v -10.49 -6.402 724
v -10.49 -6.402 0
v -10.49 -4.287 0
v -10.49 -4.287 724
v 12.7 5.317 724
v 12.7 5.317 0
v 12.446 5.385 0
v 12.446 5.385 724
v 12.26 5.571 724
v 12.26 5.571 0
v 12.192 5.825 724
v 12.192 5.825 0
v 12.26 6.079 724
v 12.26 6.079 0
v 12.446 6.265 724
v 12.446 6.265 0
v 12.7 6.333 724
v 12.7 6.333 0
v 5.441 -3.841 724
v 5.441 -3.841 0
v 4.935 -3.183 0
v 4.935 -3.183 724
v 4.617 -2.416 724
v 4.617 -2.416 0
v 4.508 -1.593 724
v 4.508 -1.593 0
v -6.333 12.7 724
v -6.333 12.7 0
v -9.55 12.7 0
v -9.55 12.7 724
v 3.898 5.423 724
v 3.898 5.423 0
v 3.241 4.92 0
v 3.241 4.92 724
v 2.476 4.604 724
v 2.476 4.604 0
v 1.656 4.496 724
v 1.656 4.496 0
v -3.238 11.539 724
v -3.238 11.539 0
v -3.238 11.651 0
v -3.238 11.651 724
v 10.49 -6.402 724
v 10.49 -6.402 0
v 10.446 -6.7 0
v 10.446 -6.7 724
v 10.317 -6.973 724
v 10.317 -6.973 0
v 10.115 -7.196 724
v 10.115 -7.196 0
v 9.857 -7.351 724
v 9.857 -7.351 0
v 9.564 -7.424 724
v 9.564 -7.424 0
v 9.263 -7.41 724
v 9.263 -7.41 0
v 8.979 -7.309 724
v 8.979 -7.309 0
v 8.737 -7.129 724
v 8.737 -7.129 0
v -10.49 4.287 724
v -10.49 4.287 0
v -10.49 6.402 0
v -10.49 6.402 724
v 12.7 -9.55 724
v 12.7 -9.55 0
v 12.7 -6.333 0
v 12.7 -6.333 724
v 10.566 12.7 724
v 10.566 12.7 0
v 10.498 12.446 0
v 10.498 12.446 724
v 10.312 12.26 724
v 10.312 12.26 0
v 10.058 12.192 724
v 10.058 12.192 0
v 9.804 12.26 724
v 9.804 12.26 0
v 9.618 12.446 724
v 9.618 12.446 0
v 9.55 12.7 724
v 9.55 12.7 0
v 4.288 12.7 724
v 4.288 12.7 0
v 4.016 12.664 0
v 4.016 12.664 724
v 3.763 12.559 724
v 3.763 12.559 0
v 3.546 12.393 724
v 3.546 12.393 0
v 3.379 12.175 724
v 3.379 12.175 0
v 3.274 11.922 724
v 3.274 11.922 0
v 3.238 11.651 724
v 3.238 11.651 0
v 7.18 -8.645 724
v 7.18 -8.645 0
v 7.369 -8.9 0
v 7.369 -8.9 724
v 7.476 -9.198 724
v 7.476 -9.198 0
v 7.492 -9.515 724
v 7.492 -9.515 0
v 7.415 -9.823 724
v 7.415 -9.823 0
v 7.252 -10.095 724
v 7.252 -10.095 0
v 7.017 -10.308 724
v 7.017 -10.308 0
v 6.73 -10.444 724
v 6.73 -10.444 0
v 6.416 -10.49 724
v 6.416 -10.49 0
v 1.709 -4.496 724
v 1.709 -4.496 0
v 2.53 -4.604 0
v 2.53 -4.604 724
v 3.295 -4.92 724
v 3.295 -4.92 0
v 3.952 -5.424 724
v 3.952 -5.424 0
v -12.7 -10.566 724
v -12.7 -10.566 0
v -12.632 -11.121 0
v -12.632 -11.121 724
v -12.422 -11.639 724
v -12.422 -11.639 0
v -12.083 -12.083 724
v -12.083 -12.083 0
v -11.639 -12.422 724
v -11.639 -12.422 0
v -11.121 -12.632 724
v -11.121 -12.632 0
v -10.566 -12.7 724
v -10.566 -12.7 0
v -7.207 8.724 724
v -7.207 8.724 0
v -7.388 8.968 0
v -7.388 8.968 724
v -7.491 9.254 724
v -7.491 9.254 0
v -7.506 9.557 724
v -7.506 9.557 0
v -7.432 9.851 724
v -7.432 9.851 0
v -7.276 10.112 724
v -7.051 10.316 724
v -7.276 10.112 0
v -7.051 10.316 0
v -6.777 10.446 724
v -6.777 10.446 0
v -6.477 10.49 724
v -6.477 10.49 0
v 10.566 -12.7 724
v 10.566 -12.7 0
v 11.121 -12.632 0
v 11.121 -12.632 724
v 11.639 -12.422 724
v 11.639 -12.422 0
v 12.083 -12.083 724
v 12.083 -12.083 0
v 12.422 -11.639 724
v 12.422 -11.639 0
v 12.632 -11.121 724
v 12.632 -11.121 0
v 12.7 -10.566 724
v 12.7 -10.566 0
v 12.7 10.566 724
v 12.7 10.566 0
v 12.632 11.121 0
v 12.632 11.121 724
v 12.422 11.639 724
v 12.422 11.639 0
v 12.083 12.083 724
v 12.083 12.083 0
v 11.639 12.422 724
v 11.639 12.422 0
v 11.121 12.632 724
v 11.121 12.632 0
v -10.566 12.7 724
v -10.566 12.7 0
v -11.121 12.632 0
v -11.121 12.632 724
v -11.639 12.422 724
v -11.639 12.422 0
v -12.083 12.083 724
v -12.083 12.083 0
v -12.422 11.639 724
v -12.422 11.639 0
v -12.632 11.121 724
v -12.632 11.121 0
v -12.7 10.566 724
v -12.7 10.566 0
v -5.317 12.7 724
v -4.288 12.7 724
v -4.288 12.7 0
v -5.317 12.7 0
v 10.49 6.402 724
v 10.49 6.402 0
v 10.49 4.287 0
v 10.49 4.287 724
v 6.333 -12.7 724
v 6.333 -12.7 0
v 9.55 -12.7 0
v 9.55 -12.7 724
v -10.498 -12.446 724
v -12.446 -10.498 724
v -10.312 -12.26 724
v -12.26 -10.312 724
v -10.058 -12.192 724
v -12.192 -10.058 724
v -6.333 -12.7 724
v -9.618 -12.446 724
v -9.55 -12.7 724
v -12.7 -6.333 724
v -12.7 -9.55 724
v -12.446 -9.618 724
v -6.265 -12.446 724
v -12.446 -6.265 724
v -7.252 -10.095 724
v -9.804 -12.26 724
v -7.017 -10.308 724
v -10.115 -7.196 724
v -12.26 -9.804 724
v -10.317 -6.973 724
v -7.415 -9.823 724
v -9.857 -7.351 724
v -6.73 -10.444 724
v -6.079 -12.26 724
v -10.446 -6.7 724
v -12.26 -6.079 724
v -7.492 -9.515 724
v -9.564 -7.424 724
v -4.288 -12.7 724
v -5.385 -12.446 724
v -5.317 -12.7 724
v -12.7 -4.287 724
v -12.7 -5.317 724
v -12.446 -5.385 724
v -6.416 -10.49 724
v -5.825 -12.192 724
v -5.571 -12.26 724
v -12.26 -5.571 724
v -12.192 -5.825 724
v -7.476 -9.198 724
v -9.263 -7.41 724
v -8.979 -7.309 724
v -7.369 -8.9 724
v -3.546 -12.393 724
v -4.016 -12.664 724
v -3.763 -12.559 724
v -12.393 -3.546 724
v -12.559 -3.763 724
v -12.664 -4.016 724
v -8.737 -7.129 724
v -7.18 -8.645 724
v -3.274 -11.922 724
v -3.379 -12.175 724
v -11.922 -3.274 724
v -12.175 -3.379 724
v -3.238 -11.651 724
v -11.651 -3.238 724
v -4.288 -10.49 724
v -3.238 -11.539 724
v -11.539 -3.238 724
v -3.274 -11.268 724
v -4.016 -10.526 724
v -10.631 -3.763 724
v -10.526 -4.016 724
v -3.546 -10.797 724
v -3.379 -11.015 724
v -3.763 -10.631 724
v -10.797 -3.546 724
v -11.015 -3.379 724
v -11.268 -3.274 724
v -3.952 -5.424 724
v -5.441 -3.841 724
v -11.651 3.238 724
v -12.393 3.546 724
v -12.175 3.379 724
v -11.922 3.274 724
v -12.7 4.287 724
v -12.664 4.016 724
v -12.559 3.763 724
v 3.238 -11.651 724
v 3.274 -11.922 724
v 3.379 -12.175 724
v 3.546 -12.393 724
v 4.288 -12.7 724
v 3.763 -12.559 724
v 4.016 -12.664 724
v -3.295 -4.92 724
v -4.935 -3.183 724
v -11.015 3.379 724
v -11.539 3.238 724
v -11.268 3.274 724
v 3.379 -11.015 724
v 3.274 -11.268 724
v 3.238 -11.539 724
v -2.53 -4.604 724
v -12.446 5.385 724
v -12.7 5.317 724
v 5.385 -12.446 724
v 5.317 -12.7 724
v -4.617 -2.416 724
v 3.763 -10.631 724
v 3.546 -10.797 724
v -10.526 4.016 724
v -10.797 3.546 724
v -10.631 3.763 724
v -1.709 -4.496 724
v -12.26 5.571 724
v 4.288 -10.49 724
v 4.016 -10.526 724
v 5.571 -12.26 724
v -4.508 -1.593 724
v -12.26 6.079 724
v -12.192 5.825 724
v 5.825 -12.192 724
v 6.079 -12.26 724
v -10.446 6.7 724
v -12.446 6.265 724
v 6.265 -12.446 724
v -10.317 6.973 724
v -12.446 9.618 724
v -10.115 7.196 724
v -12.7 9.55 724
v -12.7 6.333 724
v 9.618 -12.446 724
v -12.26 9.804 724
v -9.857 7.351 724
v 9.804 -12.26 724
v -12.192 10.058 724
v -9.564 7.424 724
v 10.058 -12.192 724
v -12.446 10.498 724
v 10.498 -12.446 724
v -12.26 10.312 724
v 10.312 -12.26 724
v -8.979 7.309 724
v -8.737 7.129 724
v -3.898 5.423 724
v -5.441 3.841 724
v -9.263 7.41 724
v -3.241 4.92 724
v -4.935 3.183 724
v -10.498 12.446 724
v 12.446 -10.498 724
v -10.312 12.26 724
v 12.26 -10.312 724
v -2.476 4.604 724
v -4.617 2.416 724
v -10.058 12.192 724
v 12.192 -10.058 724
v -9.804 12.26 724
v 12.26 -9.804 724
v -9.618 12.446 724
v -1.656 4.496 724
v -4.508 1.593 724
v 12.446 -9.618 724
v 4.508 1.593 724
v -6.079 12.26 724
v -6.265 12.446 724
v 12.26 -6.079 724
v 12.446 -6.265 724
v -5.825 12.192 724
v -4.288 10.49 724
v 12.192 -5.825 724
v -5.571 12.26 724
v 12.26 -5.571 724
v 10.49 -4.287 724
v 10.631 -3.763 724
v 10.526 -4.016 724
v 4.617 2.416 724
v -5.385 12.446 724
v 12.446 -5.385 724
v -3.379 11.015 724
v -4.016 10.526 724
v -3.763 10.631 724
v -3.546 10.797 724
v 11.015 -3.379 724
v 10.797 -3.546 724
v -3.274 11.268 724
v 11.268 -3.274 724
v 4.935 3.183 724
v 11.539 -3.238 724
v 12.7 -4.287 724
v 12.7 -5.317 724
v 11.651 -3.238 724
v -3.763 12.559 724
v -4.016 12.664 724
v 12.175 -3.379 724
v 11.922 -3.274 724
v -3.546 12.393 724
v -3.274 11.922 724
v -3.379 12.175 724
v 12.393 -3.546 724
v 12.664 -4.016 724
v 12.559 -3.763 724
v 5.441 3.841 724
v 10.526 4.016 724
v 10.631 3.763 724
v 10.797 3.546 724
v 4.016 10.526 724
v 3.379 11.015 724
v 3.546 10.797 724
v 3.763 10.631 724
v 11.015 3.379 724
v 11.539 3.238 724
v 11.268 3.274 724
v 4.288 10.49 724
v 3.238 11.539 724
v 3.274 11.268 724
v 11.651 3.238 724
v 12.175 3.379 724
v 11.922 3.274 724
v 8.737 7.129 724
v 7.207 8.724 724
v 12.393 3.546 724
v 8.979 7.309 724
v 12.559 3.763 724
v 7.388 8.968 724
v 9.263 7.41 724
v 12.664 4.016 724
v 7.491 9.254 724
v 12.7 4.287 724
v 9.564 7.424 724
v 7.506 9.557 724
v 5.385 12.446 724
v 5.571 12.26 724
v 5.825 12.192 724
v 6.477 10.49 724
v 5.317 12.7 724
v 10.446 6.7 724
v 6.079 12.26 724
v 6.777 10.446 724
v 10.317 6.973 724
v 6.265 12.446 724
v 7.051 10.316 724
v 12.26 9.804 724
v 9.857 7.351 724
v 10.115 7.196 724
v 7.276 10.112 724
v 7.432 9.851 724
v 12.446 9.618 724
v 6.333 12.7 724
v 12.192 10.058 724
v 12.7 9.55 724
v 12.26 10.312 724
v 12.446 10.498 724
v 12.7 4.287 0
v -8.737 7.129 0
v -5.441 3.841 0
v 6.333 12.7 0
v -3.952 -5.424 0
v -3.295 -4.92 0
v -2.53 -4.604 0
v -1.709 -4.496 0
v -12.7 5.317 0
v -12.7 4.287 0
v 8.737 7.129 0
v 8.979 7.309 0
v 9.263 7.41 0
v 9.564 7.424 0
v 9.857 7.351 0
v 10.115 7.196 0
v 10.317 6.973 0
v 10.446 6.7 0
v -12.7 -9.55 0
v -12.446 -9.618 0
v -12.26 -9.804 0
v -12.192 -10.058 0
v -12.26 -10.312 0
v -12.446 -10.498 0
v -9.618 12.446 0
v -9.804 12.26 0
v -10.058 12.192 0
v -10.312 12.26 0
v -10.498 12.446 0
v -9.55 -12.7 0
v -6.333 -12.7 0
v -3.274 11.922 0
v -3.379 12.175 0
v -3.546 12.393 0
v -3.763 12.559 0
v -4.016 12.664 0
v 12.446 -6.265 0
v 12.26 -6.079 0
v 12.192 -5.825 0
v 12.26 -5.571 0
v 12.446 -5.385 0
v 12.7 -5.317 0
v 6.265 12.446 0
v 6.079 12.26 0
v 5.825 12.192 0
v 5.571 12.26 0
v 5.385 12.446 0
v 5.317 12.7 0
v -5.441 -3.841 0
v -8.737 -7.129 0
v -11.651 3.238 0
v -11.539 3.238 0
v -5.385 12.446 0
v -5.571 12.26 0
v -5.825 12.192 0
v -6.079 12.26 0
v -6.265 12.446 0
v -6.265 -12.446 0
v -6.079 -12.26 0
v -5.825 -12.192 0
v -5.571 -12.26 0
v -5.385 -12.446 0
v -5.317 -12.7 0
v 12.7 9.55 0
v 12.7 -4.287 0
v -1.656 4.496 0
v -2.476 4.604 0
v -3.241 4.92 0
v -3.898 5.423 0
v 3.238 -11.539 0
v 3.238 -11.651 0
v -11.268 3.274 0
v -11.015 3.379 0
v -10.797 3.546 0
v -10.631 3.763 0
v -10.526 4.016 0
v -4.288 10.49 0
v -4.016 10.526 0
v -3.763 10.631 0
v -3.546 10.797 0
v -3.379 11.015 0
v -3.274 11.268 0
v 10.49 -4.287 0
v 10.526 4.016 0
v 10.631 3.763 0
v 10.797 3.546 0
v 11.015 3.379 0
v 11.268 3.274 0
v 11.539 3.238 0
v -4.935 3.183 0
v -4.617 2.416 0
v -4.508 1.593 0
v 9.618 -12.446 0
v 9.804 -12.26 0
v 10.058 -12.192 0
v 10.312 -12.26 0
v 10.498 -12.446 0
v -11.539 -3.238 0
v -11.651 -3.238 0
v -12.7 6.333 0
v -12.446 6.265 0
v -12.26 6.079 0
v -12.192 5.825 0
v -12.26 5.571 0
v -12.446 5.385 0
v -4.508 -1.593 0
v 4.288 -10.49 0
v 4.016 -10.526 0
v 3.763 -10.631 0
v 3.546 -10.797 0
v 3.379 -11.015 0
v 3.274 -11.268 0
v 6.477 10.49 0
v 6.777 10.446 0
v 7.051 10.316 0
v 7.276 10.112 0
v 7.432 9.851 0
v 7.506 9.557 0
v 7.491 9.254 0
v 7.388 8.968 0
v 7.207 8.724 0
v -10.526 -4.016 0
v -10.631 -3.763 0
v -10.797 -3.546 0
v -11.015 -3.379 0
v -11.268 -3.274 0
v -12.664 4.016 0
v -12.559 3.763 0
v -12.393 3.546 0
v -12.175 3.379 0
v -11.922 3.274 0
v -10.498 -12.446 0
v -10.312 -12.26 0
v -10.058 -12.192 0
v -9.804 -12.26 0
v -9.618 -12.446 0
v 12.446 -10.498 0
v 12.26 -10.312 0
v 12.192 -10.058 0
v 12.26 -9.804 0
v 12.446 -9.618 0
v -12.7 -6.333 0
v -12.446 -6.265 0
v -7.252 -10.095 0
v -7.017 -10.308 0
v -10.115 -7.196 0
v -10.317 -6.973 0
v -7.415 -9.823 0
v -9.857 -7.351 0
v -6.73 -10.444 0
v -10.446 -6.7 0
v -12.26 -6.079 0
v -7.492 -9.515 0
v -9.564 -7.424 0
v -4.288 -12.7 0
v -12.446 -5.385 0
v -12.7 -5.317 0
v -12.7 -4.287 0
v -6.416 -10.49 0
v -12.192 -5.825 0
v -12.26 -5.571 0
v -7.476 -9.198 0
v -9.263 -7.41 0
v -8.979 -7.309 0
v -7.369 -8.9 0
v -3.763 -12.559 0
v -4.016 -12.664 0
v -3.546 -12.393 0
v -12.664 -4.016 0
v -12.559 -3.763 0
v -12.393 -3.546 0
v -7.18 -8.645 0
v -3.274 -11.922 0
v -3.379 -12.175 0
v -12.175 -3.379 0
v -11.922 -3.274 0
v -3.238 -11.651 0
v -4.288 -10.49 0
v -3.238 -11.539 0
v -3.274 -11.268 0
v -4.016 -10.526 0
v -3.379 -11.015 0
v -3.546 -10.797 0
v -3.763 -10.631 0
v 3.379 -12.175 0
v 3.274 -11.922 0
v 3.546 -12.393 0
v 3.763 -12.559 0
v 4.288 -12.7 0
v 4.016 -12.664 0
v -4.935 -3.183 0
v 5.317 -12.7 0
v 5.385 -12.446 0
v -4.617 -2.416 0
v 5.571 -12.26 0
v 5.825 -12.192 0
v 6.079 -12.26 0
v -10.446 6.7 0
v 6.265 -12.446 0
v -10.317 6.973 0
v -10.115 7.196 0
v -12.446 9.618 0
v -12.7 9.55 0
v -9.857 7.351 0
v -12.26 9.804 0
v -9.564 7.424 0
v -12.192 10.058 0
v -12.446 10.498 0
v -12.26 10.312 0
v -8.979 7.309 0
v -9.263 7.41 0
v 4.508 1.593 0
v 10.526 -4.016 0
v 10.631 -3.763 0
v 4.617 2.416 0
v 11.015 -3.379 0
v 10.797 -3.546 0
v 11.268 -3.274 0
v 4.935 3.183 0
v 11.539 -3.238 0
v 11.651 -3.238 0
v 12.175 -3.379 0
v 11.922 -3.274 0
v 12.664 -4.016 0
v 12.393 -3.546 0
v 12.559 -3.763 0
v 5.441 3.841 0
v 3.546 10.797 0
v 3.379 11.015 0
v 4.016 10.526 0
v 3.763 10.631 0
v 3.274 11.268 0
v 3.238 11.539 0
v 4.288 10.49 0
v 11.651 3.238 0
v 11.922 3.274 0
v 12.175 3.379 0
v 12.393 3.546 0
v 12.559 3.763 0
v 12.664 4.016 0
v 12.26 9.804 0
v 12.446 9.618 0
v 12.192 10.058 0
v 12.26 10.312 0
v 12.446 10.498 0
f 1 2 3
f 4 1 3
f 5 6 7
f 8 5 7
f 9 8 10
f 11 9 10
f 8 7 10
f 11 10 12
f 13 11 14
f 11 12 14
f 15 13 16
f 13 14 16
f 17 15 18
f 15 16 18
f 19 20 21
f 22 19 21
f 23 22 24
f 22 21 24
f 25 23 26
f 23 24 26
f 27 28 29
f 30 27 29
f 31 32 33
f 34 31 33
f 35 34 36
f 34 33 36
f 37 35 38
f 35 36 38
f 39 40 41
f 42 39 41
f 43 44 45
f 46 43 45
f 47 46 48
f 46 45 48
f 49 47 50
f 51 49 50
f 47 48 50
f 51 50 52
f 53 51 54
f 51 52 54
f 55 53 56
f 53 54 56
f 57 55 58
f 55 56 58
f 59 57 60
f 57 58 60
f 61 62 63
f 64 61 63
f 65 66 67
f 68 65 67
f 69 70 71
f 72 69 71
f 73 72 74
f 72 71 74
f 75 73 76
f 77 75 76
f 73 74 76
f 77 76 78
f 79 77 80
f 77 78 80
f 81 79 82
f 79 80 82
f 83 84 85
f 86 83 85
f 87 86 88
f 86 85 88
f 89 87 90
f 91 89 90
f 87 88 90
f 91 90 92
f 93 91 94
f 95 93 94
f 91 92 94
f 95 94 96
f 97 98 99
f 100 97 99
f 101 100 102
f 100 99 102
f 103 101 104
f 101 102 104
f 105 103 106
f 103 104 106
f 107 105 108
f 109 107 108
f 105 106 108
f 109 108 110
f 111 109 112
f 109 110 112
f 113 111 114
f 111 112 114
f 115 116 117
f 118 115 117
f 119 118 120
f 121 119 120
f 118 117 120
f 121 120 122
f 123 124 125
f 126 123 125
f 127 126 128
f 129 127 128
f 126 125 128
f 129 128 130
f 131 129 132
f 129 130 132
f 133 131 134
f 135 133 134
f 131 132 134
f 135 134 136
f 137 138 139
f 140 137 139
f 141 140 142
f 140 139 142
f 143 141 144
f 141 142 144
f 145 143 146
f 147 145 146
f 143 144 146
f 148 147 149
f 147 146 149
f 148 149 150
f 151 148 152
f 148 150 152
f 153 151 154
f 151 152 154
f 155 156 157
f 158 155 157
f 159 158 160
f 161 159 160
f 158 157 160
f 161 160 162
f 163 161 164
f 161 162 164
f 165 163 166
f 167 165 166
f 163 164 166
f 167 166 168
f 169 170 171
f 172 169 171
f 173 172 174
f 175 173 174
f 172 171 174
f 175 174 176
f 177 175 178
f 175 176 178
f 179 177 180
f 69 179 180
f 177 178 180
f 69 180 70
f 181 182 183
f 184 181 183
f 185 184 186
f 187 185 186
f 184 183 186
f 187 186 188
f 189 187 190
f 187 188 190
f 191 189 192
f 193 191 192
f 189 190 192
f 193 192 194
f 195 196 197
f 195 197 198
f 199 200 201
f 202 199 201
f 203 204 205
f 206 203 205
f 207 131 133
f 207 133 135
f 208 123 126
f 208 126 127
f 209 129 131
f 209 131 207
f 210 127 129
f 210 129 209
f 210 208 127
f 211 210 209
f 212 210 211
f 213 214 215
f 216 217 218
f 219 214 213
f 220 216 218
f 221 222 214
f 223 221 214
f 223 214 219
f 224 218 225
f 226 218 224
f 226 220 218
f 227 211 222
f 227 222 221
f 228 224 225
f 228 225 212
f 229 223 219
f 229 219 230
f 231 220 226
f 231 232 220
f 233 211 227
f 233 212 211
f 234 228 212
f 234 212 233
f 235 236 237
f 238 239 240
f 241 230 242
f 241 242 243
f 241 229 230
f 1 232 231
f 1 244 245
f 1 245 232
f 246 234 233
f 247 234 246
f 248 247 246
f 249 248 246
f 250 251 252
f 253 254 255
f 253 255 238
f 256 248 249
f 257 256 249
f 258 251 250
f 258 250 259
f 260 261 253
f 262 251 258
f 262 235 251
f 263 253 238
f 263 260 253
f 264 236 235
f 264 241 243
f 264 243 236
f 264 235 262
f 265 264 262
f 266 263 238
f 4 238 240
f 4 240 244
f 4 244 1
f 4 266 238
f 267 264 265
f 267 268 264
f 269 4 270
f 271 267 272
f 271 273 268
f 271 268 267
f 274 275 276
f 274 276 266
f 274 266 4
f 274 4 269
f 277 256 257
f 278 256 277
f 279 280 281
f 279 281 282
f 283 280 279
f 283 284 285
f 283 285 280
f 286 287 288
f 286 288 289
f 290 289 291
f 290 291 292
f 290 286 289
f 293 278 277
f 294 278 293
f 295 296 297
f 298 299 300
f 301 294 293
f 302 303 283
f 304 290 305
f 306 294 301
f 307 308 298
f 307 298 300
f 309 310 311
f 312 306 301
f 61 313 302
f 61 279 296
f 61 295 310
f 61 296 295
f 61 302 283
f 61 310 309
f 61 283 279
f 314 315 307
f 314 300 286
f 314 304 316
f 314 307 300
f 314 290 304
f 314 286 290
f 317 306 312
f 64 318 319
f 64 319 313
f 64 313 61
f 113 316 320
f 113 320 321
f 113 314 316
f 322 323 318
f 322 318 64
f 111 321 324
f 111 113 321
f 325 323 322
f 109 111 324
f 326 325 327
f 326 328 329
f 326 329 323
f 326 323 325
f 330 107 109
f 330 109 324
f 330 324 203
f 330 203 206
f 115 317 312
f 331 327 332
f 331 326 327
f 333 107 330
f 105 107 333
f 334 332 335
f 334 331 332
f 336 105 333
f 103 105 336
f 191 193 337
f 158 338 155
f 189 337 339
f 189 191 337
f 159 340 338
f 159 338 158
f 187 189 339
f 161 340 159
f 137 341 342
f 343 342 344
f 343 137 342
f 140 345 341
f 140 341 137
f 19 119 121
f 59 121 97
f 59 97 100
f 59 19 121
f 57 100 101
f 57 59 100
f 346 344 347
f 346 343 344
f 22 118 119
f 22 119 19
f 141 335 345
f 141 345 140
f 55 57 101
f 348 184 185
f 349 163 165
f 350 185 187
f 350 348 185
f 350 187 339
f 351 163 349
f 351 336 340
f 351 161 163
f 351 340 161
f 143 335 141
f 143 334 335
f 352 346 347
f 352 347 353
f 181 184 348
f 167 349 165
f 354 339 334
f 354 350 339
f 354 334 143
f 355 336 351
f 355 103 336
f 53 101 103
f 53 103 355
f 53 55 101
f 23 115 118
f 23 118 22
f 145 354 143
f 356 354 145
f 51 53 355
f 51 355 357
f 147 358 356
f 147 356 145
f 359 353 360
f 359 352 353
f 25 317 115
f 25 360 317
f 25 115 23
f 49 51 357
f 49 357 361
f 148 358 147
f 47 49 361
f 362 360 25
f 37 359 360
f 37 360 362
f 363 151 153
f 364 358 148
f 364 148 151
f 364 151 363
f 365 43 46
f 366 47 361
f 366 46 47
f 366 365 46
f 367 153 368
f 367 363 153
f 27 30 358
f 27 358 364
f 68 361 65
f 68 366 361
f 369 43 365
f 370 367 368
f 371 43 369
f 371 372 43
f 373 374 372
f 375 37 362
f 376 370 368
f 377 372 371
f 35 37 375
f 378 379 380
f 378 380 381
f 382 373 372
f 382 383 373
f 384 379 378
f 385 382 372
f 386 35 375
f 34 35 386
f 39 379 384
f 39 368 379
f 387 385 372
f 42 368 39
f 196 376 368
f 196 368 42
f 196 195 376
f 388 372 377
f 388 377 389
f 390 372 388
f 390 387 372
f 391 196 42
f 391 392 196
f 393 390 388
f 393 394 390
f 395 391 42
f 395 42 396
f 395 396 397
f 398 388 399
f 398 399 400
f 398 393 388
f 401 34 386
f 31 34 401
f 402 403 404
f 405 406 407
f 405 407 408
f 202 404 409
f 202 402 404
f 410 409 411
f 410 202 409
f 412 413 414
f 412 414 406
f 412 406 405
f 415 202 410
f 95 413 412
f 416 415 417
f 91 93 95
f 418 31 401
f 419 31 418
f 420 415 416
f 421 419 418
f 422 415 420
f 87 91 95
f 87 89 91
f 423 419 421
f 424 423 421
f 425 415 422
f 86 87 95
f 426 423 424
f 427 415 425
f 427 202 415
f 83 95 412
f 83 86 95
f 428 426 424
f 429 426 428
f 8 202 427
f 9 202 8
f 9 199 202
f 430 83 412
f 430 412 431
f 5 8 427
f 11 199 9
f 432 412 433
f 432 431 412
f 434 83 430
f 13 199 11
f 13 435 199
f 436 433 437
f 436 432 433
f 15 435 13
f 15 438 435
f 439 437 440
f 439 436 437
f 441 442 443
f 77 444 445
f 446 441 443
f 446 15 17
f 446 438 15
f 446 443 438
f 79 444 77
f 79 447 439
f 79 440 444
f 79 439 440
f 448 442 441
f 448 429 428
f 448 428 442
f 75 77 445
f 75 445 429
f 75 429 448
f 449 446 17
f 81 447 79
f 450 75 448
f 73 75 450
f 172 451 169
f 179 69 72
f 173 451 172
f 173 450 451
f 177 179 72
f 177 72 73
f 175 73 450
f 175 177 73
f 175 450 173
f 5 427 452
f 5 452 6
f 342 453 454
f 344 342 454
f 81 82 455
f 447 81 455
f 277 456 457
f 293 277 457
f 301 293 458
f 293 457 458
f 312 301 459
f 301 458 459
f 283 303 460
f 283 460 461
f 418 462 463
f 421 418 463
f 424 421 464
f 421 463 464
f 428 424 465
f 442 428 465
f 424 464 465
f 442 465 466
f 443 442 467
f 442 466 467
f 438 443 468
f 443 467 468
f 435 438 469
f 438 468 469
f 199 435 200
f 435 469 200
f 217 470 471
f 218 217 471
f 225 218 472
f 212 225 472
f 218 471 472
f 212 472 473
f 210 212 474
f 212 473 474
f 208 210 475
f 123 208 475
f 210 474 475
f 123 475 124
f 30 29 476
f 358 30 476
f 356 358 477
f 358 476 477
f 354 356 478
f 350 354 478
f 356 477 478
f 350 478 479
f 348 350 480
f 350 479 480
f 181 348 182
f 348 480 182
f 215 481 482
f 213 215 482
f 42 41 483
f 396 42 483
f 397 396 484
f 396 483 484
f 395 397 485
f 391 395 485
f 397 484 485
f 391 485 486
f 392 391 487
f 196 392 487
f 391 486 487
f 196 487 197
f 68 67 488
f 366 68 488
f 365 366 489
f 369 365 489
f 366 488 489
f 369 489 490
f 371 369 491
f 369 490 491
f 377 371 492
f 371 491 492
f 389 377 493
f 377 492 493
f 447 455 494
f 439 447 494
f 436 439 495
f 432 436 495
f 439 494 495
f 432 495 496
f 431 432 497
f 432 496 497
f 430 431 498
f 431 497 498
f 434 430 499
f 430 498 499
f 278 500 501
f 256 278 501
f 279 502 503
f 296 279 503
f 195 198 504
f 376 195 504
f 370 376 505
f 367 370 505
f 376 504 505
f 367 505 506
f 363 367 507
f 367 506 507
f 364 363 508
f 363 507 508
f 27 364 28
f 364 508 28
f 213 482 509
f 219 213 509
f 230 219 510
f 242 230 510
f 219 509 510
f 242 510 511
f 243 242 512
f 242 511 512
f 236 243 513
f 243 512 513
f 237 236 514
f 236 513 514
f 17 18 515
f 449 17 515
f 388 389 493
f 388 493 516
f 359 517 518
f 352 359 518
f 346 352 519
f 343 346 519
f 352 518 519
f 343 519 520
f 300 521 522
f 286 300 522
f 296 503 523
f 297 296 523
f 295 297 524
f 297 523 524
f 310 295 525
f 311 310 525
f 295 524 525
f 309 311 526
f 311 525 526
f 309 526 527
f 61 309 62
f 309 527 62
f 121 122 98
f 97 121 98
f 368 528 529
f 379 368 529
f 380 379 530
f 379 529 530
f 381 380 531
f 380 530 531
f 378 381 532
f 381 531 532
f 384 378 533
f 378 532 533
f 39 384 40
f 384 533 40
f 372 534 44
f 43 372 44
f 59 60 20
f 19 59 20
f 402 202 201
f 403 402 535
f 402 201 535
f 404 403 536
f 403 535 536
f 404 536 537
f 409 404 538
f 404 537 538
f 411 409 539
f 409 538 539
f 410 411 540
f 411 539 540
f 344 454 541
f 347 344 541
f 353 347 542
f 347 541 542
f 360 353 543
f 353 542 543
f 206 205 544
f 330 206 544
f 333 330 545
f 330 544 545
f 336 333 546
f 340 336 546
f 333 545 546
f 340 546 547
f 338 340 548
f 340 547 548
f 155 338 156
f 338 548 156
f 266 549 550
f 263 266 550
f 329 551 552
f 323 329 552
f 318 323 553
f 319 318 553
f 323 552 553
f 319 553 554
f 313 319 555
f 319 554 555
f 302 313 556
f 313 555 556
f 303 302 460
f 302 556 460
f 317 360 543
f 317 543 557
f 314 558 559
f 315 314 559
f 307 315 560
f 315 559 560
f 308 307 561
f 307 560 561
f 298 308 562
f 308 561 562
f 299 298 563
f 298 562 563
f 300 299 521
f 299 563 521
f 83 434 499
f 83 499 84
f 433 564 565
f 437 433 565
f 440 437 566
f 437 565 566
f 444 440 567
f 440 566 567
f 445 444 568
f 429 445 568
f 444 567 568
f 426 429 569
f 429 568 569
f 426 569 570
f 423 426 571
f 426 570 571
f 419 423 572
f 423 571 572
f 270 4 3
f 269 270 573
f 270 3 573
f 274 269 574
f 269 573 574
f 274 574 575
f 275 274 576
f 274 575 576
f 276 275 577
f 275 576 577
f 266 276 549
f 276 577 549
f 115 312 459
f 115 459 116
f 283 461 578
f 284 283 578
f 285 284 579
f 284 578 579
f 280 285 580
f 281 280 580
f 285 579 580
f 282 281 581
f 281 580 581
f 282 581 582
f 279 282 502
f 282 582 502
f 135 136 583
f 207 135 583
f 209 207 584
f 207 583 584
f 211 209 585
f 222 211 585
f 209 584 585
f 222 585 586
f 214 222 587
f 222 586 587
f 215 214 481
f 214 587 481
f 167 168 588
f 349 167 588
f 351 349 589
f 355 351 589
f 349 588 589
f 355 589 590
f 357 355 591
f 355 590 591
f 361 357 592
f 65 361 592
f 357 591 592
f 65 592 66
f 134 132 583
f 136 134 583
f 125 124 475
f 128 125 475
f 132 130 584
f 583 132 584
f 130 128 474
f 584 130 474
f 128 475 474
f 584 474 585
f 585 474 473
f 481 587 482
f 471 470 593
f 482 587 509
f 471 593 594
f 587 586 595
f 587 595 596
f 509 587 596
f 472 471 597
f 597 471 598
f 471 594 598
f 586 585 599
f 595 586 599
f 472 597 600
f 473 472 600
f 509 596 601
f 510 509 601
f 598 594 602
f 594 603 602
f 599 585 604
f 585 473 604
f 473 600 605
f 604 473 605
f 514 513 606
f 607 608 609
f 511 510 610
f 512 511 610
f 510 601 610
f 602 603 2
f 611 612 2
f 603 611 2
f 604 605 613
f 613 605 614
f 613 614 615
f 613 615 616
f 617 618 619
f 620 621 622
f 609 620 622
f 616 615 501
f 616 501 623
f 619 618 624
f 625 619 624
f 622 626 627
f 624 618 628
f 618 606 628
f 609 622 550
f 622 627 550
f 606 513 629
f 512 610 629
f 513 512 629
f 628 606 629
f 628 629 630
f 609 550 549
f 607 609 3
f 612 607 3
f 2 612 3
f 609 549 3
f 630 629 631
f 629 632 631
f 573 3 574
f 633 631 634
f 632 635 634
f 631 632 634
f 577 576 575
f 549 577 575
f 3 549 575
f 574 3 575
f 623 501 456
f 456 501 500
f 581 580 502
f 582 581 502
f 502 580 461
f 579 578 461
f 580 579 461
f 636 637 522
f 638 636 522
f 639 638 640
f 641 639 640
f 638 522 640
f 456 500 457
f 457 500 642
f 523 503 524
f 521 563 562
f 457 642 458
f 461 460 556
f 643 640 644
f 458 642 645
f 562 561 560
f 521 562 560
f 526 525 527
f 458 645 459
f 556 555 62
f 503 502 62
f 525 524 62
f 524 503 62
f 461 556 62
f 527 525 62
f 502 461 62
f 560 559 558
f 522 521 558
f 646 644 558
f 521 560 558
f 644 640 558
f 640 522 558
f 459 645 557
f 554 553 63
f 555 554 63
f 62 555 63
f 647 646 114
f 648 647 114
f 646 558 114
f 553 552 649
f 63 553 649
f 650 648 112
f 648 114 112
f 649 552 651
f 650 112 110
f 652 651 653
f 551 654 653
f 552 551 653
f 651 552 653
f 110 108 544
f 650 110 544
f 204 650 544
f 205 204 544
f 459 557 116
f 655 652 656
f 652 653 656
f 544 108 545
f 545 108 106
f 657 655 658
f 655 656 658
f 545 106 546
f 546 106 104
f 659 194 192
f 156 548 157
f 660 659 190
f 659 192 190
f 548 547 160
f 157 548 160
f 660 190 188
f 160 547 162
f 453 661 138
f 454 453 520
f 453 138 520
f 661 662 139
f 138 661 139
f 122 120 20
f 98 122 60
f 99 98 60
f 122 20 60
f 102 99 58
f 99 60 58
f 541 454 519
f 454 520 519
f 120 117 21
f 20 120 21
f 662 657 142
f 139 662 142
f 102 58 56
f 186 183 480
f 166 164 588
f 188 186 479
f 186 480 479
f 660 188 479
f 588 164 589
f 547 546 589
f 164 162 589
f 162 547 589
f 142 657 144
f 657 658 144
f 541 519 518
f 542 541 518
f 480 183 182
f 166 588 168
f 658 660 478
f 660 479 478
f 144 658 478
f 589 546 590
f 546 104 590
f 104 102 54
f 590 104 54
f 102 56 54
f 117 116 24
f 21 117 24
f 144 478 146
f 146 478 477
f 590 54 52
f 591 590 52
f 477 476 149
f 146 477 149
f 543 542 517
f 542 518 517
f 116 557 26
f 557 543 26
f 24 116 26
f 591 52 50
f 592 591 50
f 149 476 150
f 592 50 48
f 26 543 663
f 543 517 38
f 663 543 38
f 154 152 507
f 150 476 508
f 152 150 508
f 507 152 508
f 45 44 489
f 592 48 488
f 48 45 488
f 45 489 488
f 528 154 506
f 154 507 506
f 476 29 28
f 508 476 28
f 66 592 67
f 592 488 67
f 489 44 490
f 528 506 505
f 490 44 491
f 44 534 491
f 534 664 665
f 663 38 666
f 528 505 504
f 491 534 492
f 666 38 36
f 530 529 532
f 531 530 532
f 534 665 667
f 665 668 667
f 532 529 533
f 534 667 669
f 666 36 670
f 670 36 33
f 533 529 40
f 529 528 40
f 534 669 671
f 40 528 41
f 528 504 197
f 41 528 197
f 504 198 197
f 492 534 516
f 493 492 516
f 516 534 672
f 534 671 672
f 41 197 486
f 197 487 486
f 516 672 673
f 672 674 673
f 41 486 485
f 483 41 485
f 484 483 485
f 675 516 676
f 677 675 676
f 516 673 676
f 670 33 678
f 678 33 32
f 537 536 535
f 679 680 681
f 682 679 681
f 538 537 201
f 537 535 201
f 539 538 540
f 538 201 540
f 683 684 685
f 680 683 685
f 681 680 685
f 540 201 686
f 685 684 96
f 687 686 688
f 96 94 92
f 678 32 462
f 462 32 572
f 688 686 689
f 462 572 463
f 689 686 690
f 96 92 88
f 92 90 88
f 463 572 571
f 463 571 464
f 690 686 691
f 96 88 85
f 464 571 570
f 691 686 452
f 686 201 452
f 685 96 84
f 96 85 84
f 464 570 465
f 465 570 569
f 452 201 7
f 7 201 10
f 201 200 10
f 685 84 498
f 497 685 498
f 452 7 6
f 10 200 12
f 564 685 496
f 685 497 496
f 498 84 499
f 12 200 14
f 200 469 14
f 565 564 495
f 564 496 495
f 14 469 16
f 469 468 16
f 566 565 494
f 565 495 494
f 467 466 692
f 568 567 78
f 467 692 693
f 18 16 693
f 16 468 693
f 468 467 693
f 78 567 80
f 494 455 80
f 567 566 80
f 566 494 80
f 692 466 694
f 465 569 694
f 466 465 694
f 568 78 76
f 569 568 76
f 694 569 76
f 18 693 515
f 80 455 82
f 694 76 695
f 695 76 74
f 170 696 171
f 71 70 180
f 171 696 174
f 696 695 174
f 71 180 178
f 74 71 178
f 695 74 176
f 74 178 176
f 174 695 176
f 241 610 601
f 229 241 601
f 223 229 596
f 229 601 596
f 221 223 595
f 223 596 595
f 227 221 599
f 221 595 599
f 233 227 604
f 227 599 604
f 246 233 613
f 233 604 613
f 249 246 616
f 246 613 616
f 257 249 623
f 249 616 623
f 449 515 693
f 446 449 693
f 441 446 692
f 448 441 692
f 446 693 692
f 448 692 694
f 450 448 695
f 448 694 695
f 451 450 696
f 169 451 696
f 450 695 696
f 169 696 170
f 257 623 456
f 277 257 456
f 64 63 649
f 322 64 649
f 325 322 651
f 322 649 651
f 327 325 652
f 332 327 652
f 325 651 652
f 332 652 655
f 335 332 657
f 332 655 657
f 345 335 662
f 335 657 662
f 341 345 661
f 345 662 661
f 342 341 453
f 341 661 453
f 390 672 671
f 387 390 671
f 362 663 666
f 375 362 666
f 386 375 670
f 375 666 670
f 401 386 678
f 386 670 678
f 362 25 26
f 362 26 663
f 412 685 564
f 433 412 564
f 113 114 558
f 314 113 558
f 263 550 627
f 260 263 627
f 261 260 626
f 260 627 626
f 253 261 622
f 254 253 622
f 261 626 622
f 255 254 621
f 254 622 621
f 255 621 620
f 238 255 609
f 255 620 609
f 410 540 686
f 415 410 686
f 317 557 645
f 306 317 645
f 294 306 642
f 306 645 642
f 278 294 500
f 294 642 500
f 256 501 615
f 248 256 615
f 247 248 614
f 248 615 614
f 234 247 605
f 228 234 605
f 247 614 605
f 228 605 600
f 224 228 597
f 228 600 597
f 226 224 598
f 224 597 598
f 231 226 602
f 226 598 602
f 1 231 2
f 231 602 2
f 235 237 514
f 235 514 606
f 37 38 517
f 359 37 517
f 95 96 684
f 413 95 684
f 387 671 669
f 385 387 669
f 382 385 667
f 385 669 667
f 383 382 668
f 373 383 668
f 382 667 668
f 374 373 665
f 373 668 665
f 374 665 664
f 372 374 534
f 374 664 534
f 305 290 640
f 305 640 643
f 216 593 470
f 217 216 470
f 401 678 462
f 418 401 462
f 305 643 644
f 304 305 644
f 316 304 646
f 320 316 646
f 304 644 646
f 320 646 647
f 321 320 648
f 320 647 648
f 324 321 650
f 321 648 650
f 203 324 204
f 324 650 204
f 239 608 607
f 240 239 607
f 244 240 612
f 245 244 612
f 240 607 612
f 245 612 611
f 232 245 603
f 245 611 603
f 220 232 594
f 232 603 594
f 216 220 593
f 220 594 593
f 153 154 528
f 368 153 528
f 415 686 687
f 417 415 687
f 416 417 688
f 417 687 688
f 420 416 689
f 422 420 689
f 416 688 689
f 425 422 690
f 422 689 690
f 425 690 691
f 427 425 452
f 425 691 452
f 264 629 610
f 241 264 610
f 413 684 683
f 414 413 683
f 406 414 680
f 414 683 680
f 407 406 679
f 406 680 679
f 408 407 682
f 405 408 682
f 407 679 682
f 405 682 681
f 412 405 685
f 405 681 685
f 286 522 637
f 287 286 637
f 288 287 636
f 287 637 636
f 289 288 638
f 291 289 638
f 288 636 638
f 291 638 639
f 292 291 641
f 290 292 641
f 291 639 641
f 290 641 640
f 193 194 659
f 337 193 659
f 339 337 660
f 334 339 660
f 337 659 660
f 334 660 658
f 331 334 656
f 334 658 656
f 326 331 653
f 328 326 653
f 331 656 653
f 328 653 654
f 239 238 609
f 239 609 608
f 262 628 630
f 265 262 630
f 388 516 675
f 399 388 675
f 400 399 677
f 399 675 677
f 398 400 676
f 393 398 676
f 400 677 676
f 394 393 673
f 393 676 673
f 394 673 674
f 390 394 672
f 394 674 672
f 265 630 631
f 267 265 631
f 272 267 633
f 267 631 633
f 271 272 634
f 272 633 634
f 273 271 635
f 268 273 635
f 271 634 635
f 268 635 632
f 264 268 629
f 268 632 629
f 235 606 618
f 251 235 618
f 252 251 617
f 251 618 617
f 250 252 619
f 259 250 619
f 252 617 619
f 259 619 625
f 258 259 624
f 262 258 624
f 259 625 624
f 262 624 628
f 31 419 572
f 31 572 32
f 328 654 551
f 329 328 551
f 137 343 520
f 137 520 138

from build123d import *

# Parameters (mm, degrees)
F1_DEPTH = 724


with BuildPart() as f1:
    # F0 (on Top) → F1 (new body)
    with BuildSketch(Plane.XY):
        with BuildLine():
            ThreePointArc((-10.4902, 6.402089), (-9.856505, 7.351068), (-8.737131, 7.129409))
            Line((-8.737131, 7.129409), (-5.441006, 3.840816))
            ThreePointArc((-5.441006, 3.840816), (-4.750878, 2.809883), (-4.5085, 1.593186))
            Line((-4.5085, 1.593186), (-4.5085, -1.593186))
            ThreePointArc((-4.5085, -1.593186), (-4.750878, -2.809883), (-5.441006, -3.840816))
            Line((-5.441006, -3.840816), (-8.737131, -7.129409))
            ThreePointArc((-8.737131, -7.129409), (-9.856505, -7.351068), (-10.4902, -6.402089))
            Line((-10.4902, -6.402089), (-10.4902, -4.287469))
            ThreePointArc((-10.4902, -4.287469), (-10.797449, -3.545706), (-11.539212, -3.238457))
            Line((-11.539212, -3.238457), (-11.650988, -3.238457))
            ThreePointArc((-11.650988, -3.238457), (-12.392751, -3.545706), (-12.7, -4.287469))
            Line((-12.7, -4.287469), (-12.7, -5.317084))
            ThreePointArc((-12.7, -5.317084), (-12.192, -5.825084), (-12.7, -6.333084))
            Line((-12.7, -6.333084), (-12.7, -9.5504))
            ThreePointArc((-12.7, -9.5504), (-12.191923, -10.058323), (-12.699847, -10.5664))
            ThreePointArc((-12.699847, -10.5664), (-12.082538, -12.082507), (-10.566443, -12.699848))
            ThreePointArc((-10.566443, -12.699848), (-10.058367, -12.191924), (-9.550443, -12.7))
            Line((-9.550443, -12.7), (-6.333127, -12.7))
            ThreePointArc((-6.333127, -12.7), (-5.825127, -12.192), (-5.317127, -12.7))
            Line((-5.317127, -12.7), (-4.287512, -12.7))
            ThreePointArc((-4.287512, -12.7), (-3.545749, -12.392751), (-3.2385, -11.650988))
            Line((-3.2385, -11.650988), (-3.2385, -11.539212))
            ThreePointArc((-3.2385, -11.539212), (-3.545749, -10.797449), (-4.287512, -10.4902))
            Line((-4.287512, -10.4902), (-6.416408, -10.4902))
            ThreePointArc((-6.416408, -10.4902), (-7.414731, -9.822813), (-7.17965, -8.645193))
            Line((-7.17965, -8.645193), (-3.95227, -5.42369))
            ThreePointArc((-3.95227, -5.42369), (-2.922936, -4.736929), (-1.709254, -4.4958))
            Line((-1.709254, -4.4958), (1.709254, -4.4958))
            ThreePointArc((1.709254, -4.4958), (2.922936, -4.736929), (3.95227, -5.42369))
            Line((3.95227, -5.42369), (7.17965, -8.645193))
            ThreePointArc((7.17965, -8.645193), (7.414731, -9.822813), (6.416408, -10.4902))
            Line((6.416408, -10.4902), (4.287512, -10.4902))
            ThreePointArc((4.287512, -10.4902), (3.545749, -10.797449), (3.2385, -11.539212))
            Line((3.2385, -11.539212), (3.2385, -11.650988))
            ThreePointArc((3.2385, -11.650988), (3.545749, -12.392751), (4.287512, -12.7))
            Line((4.287512, -12.7), (5.317127, -12.7))
            ThreePointArc((5.317127, -12.7), (5.825127, -12.192), (6.333127, -12.7))
            Line((6.333127, -12.7), (9.550443, -12.7))
            ThreePointArc((9.550443, -12.7), (10.058367, -12.191924), (10.566443, -12.699848))
            ThreePointArc((10.566443, -12.699848), (12.082538, -12.082507), (12.699847, -10.5664))
            ThreePointArc((12.699847, -10.5664), (12.191923, -10.058323), (12.7, -9.5504))
            Line((12.7, -9.5504), (12.7, -6.333084))
            ThreePointArc((12.7, -6.333084), (12.192, -5.825084), (12.7, -5.317084))
            Line((12.7, -5.317084), (12.7, -4.287469))
            ThreePointArc((12.7, -4.287469), (12.392751, -3.545706), (11.650988, -3.238457))
            Line((11.650988, -3.238457), (11.539212, -3.238457))
            ThreePointArc((11.539212, -3.238457), (10.797449, -3.545706), (10.4902, -4.287469))
            Line((10.4902, -4.287469), (10.4902, -6.402089))
            ThreePointArc((10.4902, -6.402089), (9.856505, -7.351068), (8.737131, -7.129409))
            Line((8.737131, -7.129409), (5.441006, -3.840816))
            ThreePointArc((5.441006, -3.840816), (4.750878, -2.809883), (4.5085, -1.593186))
            Line((4.5085, -1.593186), (4.5085, 1.593186))
            ThreePointArc((4.5085, 1.593186), (4.750878, 2.809883), (5.441006, 3.840816))
            Line((5.441006, 3.840816), (8.737131, 7.129409))
            ThreePointArc((8.737131, 7.129409), (9.856505, 7.351068), (10.4902, 6.402089))
            Line((10.4902, 6.402089), (10.4902, 4.287469))
            ThreePointArc((10.4902, 4.287469), (10.797449, 3.545706), (11.539212, 3.238457))
            Line((11.539212, 3.238457), (11.650988, 3.238457))
            ThreePointArc((11.650988, 3.238457), (12.392751, 3.545706), (12.7, 4.287469))
            Line((12.7, 4.287469), (12.7, 5.317084))
            ThreePointArc((12.7, 5.317084), (12.192, 5.825084), (12.7, 6.333084))
            Line((12.7, 6.333084), (12.7, 9.5504))
            ThreePointArc((12.7, 9.5504), (12.191923, 10.058323), (12.699847, 10.5664))
            ThreePointArc((12.699847, 10.5664), (12.082538, 12.082507), (10.566443, 12.699848))
            ThreePointArc((10.566443, 12.699848), (10.058367, 12.191924), (9.550443, 12.7))
            Line((9.550443, 12.7), (6.333127, 12.7))
            ThreePointArc((6.333127, 12.7), (5.825127, 12.192), (5.317127, 12.7))
            Line((5.317127, 12.7), (4.287512, 12.7))
            ThreePointArc((4.287512, 12.7), (3.545749, 12.392751), (3.2385, 11.650988))
            Line((3.2385, 11.650988), (3.2385, 11.539212))
            ThreePointArc((3.2385, 11.539212), (3.545749, 10.797449), (4.287512, 10.4902))
            Line((4.287512, 10.4902), (6.476789, 10.4902))
            ThreePointArc((6.476789, 10.4902), (7.432222, 9.851404), (7.207036, 8.724371))
            Line((7.207036, 8.724371), (3.898273, 5.423169))
            ThreePointArc((3.898273, 5.423169), (2.86912, 4.736788), (1.655778, 4.4958))
            Line((1.655778, 4.4958), (-1.655778, 4.4958))
            ThreePointArc((-1.655778, 4.4958), (-2.86912, 4.736788), (-3.898273, 5.423169))
            Line((-3.898273, 5.423169), (-7.207036, 8.724371))
            ThreePointArc((-7.207036, 8.724371), (-7.432222, 9.851404), (-6.476789, 10.4902))
            Line((-6.476789, 10.4902), (-4.287512, 10.4902))
            ThreePointArc((-4.287512, 10.4902), (-3.545749, 10.797449), (-3.2385, 11.539212))
            Line((-3.2385, 11.539212), (-3.2385, 11.650988))
            ThreePointArc((-3.2385, 11.650988), (-3.545749, 12.392751), (-4.287512, 12.7))
            Line((-4.287512, 12.7), (-5.317127, 12.7))
            ThreePointArc((-5.317127, 12.7), (-5.825127, 12.192), (-6.333127, 12.7))
            Line((-6.333127, 12.7), (-9.550443, 12.7))
            ThreePointArc((-9.550443, 12.7), (-10.058367, 12.191924), (-10.566443, 12.699848))
            ThreePointArc((-10.566443, 12.699848), (-12.082538, 12.082507), (-12.699847, 10.5664))
            ThreePointArc((-12.699847, 10.5664), (-12.191923, 10.058323), (-12.7, 9.5504))
            Line((-12.7, 9.5504), (-12.7, 6.333084))
            ThreePointArc((-12.7, 6.333084), (-12.192, 5.825084), (-12.7, 5.317084))
            Line((-12.7, 5.317084), (-12.7, 4.287469))
            ThreePointArc((-12.7, 4.287469), (-12.392751, 3.545706), (-11.650988, 3.238457))
            Line((-11.650988, 3.238457), (-11.539212, 3.238457))
            ThreePointArc((-11.539212, 3.238457), (-10.797449, 3.545706), (-10.4902, 4.287469))
            Line((-10.4902, 4.287469), (-10.4902, 6.402089))
        make_face()
    extrude(amount=F1_DEPTH)


solid = f1.part
